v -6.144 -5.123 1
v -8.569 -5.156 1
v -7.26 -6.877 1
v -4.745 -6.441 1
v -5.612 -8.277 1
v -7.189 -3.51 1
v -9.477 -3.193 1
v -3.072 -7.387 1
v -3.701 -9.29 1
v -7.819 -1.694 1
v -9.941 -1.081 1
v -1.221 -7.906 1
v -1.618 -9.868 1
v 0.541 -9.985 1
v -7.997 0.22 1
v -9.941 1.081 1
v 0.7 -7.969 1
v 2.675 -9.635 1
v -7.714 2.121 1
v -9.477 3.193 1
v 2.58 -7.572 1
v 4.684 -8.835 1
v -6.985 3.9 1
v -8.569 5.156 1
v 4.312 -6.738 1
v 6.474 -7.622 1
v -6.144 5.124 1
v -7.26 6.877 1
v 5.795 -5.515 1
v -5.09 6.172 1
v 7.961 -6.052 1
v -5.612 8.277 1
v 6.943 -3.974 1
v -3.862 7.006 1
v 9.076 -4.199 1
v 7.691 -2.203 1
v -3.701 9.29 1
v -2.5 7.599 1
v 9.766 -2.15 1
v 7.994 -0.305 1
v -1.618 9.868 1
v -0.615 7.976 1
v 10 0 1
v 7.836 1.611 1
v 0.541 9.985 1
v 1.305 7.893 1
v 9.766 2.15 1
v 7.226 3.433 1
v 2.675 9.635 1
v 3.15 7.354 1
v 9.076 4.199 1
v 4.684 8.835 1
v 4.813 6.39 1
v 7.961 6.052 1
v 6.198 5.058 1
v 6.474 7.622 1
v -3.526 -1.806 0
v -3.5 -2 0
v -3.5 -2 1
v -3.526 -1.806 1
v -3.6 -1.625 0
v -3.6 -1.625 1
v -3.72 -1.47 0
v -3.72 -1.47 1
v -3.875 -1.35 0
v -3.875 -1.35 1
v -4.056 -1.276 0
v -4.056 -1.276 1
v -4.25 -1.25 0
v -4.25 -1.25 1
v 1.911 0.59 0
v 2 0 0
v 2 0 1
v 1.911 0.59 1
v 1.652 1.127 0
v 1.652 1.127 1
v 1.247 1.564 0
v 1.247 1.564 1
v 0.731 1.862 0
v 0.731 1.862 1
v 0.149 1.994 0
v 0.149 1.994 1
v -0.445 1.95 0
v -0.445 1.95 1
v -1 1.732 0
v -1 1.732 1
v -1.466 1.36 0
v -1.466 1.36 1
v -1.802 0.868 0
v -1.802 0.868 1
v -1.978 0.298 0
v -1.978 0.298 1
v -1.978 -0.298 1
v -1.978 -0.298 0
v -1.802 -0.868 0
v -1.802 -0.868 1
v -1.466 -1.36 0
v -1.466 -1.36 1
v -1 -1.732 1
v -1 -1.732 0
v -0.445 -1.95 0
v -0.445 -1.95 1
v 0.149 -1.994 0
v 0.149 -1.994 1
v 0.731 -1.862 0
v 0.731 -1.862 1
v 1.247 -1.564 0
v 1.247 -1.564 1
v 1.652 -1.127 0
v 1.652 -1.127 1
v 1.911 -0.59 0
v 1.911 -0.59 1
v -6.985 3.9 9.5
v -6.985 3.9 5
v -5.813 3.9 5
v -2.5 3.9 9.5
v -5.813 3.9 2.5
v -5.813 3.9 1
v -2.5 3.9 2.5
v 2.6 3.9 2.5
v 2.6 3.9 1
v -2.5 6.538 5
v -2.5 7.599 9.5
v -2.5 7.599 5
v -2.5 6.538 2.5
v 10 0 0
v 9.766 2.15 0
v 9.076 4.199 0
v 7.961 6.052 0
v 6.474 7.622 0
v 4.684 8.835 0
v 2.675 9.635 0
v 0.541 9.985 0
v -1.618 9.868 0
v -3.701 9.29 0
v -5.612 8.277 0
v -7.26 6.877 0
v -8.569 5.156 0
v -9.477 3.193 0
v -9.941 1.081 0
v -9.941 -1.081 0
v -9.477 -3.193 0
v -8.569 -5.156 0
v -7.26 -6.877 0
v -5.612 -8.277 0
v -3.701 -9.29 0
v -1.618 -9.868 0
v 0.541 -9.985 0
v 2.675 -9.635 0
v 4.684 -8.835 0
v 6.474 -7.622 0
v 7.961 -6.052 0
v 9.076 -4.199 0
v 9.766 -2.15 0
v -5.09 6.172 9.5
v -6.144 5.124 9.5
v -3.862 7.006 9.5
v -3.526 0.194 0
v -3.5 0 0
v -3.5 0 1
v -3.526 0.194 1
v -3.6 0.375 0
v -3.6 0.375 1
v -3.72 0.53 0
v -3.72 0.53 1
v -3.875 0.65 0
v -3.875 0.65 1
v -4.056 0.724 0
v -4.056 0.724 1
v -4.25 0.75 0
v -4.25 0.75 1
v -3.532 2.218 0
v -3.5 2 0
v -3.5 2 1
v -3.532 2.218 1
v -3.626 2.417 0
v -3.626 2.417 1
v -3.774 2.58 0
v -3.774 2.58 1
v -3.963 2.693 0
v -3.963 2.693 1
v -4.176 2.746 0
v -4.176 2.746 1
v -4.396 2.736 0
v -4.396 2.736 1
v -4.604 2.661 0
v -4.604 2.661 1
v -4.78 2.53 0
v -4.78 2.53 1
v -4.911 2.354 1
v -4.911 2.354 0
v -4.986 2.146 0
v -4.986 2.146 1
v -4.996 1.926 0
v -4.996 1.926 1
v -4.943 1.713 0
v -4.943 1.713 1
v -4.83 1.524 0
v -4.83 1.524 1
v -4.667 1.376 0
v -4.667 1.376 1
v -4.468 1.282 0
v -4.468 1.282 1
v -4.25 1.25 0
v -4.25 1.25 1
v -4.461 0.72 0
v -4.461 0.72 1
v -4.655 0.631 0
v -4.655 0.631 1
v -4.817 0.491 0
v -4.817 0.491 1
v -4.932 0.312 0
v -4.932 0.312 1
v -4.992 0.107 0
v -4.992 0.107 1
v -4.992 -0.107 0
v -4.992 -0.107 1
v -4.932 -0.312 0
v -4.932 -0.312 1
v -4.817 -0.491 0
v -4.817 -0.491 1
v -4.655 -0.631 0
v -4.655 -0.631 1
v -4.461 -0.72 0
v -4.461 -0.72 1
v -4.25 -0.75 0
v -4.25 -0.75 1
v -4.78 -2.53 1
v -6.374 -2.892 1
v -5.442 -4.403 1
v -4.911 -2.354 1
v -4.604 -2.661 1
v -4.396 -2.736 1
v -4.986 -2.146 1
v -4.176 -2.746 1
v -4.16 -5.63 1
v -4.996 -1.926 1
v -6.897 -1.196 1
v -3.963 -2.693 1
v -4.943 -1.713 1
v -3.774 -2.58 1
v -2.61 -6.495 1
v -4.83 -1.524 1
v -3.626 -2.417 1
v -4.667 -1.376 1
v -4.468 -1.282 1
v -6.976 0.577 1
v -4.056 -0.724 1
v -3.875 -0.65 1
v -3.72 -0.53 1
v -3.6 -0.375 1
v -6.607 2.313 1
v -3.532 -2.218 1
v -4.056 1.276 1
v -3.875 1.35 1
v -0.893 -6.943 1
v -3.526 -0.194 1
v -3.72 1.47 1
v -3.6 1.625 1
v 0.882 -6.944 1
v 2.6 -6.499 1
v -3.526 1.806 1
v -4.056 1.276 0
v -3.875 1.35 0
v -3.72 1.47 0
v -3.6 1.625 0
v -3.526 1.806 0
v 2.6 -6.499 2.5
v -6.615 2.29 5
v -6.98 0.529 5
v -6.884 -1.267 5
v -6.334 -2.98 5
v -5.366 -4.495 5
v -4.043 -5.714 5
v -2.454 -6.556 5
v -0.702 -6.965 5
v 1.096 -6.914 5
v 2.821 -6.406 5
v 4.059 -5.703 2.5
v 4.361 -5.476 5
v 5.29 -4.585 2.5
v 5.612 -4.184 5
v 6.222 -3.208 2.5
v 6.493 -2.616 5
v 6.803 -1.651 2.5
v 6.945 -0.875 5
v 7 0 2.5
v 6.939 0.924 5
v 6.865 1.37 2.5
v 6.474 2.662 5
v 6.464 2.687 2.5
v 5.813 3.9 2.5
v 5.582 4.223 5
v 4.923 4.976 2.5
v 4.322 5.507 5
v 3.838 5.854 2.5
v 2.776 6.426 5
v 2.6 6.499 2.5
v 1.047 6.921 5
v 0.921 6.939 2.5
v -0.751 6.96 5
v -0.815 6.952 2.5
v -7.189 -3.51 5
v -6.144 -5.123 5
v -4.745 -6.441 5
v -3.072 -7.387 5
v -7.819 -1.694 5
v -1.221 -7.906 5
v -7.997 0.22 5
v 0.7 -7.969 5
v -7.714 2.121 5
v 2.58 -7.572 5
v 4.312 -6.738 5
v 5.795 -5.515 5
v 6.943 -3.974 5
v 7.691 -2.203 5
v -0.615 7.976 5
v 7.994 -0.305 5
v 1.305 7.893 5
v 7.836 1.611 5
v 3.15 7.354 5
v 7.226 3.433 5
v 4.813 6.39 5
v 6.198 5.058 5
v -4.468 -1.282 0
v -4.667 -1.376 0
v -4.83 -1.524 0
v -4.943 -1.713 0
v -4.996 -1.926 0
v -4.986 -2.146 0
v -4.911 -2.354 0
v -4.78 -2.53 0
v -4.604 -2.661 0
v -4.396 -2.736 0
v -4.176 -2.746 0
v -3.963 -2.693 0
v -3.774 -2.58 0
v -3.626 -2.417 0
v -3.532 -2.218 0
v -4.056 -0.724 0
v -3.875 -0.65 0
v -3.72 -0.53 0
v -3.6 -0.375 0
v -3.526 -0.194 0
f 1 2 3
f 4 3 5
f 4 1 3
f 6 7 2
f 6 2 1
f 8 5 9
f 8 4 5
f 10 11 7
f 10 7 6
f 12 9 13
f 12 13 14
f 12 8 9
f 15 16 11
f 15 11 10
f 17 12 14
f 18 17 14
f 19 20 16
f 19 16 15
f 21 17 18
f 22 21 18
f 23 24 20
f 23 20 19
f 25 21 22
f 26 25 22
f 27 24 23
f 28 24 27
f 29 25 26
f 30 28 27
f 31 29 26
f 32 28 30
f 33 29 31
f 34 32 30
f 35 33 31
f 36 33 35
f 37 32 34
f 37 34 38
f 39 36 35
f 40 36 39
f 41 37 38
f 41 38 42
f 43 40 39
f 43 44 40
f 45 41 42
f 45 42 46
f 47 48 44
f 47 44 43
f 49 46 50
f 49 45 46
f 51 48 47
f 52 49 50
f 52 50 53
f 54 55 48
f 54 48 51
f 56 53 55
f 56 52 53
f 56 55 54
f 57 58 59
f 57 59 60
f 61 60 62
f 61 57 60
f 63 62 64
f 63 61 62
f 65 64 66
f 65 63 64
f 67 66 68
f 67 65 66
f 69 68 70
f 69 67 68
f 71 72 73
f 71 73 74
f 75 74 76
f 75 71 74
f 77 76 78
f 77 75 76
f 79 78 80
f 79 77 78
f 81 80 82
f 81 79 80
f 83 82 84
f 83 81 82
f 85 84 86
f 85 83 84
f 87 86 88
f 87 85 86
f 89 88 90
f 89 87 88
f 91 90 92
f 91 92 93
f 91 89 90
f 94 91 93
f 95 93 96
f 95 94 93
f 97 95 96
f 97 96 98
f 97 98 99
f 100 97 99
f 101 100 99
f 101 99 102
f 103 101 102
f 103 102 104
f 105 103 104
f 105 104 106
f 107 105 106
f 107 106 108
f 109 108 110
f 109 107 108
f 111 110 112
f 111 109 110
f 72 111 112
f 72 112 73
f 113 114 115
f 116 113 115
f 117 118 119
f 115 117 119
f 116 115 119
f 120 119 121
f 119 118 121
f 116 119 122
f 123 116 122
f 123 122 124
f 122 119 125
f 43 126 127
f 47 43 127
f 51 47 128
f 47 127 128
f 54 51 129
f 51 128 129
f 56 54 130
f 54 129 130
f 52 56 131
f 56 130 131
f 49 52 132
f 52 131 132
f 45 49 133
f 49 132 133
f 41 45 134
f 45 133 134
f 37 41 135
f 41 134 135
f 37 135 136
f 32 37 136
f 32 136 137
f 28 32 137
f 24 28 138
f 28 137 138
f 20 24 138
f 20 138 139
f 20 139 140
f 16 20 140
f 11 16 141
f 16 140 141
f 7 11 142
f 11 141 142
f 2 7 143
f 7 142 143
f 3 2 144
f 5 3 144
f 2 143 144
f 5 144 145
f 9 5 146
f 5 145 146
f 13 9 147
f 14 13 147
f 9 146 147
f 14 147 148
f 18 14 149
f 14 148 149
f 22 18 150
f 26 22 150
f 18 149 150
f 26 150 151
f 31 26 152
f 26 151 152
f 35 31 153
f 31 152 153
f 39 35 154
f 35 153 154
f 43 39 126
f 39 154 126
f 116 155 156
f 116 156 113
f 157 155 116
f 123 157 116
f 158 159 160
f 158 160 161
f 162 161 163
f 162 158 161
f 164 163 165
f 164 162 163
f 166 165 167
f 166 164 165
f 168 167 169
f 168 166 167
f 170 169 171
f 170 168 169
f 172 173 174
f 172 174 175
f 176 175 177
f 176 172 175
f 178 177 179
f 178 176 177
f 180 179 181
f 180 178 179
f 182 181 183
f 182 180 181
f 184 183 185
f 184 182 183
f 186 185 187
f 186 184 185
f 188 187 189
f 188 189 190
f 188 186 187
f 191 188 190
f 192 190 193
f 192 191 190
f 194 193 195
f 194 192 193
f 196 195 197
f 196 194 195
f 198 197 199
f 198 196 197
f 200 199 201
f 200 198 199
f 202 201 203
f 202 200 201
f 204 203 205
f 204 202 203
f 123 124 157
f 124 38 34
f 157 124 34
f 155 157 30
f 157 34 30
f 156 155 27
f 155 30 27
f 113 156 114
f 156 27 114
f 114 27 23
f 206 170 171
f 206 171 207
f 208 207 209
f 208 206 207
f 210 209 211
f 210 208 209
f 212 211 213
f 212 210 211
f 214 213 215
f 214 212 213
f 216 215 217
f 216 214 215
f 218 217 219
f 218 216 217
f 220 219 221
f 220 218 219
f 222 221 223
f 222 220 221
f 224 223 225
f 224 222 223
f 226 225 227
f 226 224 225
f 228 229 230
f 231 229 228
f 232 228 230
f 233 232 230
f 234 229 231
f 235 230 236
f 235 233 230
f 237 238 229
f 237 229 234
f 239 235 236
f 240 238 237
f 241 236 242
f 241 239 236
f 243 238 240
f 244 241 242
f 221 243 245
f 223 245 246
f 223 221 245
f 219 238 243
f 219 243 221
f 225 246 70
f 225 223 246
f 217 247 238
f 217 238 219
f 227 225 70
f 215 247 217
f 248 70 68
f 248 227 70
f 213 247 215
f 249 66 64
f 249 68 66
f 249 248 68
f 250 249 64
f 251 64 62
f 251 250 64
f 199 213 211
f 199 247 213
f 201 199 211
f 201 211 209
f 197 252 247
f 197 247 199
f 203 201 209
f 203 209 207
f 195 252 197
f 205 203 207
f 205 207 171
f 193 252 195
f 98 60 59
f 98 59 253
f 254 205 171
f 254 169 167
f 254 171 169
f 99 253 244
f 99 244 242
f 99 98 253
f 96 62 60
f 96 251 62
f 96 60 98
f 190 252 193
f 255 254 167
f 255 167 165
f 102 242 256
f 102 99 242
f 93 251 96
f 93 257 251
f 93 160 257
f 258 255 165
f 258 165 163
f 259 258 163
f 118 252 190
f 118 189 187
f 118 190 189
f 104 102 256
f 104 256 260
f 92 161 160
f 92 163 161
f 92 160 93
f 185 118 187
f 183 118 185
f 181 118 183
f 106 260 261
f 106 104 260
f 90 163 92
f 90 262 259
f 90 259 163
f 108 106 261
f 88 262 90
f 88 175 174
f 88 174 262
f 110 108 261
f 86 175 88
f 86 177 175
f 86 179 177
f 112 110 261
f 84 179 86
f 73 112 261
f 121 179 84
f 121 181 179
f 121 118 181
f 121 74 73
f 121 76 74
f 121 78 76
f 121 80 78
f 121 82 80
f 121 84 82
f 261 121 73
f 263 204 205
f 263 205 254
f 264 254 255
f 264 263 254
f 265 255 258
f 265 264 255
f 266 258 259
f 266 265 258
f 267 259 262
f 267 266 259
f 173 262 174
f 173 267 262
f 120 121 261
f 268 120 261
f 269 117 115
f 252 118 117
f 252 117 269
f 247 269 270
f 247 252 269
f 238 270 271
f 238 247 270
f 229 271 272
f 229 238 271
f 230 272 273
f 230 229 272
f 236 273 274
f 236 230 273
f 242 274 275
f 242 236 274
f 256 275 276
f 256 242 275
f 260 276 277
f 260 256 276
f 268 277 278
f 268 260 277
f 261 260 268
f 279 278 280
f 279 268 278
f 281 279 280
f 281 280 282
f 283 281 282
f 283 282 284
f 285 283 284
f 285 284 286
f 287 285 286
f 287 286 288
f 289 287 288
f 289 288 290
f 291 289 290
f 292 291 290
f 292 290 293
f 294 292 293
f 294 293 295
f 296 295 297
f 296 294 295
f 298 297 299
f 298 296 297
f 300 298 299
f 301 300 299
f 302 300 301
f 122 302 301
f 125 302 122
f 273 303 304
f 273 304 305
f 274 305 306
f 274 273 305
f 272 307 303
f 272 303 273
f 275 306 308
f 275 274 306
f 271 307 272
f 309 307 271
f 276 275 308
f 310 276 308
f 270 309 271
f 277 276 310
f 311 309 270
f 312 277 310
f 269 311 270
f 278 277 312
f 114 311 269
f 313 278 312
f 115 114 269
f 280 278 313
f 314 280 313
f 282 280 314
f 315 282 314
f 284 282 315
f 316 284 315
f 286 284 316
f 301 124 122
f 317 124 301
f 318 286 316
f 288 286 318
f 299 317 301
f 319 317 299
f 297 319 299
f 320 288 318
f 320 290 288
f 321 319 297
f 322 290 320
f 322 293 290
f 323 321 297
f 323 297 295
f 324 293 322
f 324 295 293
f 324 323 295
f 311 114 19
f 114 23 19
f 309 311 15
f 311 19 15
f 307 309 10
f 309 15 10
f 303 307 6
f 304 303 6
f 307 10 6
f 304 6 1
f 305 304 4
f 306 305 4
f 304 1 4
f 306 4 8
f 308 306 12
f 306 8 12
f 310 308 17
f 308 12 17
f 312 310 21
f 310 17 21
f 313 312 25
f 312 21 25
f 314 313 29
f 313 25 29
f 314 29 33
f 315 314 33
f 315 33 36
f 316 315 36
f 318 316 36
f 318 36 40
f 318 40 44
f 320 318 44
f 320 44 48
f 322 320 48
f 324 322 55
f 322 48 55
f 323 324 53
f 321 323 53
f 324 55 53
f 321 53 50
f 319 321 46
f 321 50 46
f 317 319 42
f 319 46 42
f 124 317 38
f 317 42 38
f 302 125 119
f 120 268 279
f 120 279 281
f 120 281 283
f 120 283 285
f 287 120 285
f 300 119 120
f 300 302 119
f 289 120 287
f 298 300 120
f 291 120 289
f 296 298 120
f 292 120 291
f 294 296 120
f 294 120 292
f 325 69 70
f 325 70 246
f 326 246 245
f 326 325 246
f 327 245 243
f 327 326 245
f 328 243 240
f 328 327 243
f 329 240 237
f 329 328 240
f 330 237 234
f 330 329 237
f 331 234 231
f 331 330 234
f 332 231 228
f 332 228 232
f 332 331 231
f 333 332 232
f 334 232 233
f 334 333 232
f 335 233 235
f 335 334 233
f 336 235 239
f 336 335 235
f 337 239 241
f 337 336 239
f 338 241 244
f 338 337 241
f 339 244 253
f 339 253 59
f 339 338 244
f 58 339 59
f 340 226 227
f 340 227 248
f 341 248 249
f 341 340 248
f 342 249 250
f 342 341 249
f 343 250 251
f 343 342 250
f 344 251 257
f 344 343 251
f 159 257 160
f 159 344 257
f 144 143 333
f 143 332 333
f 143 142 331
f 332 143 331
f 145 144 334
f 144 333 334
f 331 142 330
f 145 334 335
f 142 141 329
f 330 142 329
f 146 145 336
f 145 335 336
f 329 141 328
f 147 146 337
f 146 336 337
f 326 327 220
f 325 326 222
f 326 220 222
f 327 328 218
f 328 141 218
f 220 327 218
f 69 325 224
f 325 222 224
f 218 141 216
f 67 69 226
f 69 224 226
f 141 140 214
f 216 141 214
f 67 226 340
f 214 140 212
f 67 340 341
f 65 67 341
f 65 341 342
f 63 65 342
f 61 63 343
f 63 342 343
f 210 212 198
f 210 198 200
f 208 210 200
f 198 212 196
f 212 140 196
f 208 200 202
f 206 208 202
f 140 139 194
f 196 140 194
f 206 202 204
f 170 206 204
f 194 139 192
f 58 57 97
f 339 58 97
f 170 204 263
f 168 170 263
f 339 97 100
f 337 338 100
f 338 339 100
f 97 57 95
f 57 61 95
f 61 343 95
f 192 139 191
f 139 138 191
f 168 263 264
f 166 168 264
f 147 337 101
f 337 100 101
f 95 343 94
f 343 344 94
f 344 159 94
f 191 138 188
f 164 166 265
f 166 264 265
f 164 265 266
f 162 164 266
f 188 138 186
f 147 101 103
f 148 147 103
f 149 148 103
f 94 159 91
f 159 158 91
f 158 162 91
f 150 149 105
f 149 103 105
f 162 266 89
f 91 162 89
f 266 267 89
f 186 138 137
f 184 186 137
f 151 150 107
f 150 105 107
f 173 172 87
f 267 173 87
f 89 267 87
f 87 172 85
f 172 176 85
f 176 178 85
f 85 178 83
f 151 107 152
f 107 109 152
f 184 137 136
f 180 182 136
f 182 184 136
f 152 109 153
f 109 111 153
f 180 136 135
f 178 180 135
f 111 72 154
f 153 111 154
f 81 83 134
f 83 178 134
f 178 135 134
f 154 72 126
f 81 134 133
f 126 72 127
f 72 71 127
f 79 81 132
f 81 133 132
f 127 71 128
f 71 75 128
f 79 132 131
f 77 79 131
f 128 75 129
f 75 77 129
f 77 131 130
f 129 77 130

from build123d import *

# Parameters (mm, degrees)
F0_R     = 10
F0_R_2   = 8
F0_R_3   = 7
F0_R_4   = 2
F1_DEPTH = 1
F2_DEPTH = 5
F4_DEPTH = 1.5
F6_DEPTH = 1
F8_DEPTH = 9.5


with BuildPart() as f1:
    # F0 (on Top) → F1 (new body)
    with BuildSketch(Plane.XY):
        Circle(F0_R)
        Circle(F0_R_2, mode=Mode.SUBTRACT)
        Circle(F0_R_2)
        Circle(F0_R_3, mode=Mode.SUBTRACT)
        Circle(F0_R_3)
        Circle(F0_R_4, mode=Mode.SUBTRACT)
    extrude(amount=F1_DEPTH)

    # F0 (on Top) → F2 (join)
    with BuildSketch(Plane.XY):
        Circle(F0_R_2)
        Circle(F0_R_3, mode=Mode.SUBTRACT)
    extrude(amount=F2_DEPTH)

    # F3 (on face) → F4 (join)
    with BuildSketch(Plane.XY.offset(1)):
        with BuildLine():
            ThreePointArc((2.6, 6.4992307237), (-2.0663272833, 6.6880708398), (-5.8129166517, 3.9))
            Line((-5.8129166517, 3.9), (2.6, 3.9))
            Line((2.6, 3.9), (2.6, 6.4992307237))
        make_face()
        with BuildLine():
            Line((2.6, 6.4992307237), (2.6, 3.9))
            Line((2.6, 3.9), (5.8129166517, 3.9))
            ThreePointArc((5.8129166517, 3.9), (4.4026459926, 5.4421235069), (2.6, 6.4992307237))
        make_face()
        with BuildLine():
            Line((5.8129166517, 3.9), (2.6, 3.9))
            Line((2.6, 3.9), (2.6, -6.4992307237))
            ThreePointArc((2.6, -6.4992307237), (5.7965506985, -3.9242833741), (7, 0))
            ThreePointArc((7, 0), (6.6966565002, 2.0383306206), (5.8129166517, 3.9))
        make_face()
    extrude(amount=F4_DEPTH)

    # F5 (on Top) → F6 (cut, through all)
    with BuildSketch(Plane.XY):
        with BuildLine():
            ThreePointArc((-3.5, 2), (-4.7803300859, 2.5303300859), (-4.25, 1.25))
            ThreePointArc((-4.25, 1.25), (-3.7196699141, 1.4696699141), (-3.5, 2))
        make_face()
        with BuildLine():
            Line((-4.25, 0), (-3.5, 0))
            ThreePointArc((-3.5, 0), (-3.7196699141, 0.5303300859), (-4.25, 0.75))
            Line((-4.25, 0.75), (-4.25, 0))
        make_face()
        with BuildLine():
            Line((-4.25, -0.75), (-4.25, 0))
            Line((-4.25, 0), (-4.25, 0.75))
            ThreePointArc((-4.25, 0.75), (-5, 0), (-4.25, -0.75))
        make_face()
        with BuildLine():
            ThreePointArc((-4.25, -0.75), (-3.7196699141, -0.5303300859), (-3.5, 0))
            Line((-3.5, 0), (-4.25, 0))
            Line((-4.25, 0), (-4.25, -0.75))
        make_face()
        with BuildLine():
            ThreePointArc((-3.5, -2), (-3.7196699141, -1.4696699141), (-4.25, -1.25))
            ThreePointArc((-4.25, -1.25), (-4.7803300859, -2.5303300859), (-3.5, -2))
        make_face()
    extrude(amount=F6_DEPTH, mode=Mode.SUBTRACT)

    # F7 (on Top) → F8 (join)
    with BuildSketch(Plane.XY):
        with BuildLine():
            Line((-2.5, 3.9), (-2.5, 7.5993420768))
            ThreePointArc((-2.5, 7.5993420768), (-5.0904334607, 6.1715060708), (-6.984983894, 3.9))
            Line((-6.984983894, 3.9), (-2.5, 3.9))
        make_face()
    extrude(amount=F8_DEPTH)


solid = f1.part
